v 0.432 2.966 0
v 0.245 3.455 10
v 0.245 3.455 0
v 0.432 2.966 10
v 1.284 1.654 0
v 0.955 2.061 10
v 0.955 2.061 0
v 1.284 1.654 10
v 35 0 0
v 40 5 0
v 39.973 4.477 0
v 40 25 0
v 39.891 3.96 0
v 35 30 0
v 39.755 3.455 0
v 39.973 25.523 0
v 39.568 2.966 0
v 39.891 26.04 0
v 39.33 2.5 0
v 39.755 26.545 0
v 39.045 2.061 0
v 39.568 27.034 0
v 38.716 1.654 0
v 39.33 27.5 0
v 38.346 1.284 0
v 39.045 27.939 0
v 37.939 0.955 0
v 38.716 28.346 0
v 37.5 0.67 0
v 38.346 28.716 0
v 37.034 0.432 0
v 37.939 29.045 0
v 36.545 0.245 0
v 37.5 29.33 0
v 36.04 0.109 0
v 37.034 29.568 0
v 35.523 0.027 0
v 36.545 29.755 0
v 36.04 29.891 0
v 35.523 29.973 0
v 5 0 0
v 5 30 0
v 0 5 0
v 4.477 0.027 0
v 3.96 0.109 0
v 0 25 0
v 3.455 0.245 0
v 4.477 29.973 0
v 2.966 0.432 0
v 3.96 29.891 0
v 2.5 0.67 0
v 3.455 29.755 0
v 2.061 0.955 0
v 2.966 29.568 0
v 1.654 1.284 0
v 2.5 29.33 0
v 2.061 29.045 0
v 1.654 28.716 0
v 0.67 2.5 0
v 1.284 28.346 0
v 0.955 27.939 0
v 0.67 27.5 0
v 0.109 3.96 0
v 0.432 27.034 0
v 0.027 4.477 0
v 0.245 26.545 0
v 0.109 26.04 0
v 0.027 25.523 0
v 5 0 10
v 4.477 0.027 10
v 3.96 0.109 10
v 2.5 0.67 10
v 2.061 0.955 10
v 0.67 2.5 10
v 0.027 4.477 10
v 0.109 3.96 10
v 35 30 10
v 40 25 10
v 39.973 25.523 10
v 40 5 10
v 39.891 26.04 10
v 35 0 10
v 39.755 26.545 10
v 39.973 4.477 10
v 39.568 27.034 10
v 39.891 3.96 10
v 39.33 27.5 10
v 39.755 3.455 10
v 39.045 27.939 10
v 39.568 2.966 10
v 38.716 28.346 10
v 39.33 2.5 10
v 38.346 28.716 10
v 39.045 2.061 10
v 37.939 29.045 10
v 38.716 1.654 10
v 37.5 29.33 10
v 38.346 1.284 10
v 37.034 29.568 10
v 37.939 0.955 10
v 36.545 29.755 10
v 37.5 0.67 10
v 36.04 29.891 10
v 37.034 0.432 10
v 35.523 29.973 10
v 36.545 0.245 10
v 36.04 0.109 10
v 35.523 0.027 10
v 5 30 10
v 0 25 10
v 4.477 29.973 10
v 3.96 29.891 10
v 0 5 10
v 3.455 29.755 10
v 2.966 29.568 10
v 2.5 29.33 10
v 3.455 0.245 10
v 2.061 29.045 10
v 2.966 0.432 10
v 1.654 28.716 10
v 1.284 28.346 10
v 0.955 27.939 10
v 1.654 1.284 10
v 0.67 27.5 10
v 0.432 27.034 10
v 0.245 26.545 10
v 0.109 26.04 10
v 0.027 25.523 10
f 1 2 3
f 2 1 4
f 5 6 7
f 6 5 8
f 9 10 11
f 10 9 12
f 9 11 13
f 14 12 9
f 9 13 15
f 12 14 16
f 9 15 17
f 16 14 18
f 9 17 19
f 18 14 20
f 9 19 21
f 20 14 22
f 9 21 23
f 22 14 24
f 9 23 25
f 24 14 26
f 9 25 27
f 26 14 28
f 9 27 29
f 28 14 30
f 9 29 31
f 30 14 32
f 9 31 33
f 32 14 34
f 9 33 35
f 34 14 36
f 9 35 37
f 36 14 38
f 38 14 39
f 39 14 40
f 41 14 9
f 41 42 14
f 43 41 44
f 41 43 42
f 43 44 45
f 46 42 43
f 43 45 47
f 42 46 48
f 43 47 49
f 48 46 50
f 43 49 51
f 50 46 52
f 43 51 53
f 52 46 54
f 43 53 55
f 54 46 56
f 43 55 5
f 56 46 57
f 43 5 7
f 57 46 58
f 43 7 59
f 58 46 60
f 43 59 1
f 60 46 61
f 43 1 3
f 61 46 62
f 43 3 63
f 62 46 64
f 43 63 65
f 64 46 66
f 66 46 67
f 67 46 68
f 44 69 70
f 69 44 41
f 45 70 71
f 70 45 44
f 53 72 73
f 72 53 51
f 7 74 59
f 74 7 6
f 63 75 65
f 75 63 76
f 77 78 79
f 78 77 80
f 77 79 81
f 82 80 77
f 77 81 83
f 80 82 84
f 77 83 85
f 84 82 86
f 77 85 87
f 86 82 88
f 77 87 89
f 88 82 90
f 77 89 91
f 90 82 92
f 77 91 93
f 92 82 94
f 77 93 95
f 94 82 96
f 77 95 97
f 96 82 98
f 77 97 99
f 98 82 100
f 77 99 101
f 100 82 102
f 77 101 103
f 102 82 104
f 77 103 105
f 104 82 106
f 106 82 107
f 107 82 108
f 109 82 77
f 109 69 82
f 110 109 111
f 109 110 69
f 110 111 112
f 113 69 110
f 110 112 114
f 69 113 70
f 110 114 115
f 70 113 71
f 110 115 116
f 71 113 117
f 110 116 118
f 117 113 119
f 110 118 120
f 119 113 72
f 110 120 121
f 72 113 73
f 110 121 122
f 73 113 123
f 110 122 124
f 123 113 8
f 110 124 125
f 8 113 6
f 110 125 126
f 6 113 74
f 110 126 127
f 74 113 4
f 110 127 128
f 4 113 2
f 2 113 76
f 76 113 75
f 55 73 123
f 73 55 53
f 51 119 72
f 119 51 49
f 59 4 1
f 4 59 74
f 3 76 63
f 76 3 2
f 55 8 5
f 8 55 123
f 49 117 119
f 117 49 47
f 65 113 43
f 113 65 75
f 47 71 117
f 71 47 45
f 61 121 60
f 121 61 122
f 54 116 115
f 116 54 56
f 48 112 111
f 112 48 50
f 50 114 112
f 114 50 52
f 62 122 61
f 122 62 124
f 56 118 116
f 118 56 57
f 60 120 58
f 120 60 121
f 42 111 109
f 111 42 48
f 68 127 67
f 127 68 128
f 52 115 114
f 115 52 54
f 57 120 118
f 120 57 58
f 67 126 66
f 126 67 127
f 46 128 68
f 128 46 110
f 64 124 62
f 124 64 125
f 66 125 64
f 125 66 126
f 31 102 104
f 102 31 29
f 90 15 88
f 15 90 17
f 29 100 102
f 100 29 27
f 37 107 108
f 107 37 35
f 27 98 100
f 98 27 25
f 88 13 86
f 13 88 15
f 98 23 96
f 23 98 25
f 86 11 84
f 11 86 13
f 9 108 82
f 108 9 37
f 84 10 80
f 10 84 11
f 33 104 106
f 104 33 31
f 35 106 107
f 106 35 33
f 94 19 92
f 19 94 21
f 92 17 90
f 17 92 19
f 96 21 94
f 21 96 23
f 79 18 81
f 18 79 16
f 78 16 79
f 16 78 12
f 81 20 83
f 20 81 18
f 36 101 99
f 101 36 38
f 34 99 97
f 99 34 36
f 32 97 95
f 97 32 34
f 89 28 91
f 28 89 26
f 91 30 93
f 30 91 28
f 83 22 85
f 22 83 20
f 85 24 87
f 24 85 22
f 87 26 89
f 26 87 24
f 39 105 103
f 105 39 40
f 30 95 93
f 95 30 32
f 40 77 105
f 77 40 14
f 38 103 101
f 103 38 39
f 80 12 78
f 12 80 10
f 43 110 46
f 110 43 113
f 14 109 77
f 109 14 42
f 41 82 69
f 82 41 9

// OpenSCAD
module roundedCube(size = [1,1,1],cornerRadius = 3){
    width = size[0];
    depth = size[1];
    height = size[2];

 translate([0,cornerRadius,0])cube([width,depth - (cornerRadius * 2),height]);
    translate([cornerRadius,0,0])cube([width - (cornerRadius * 2),depth,height]);
    x = width - (cornerRadius * 2);
     y = depth - (cornerRadius * 2);
    
    for (i = [0:1]){
    for (l = [0:1]){
    translate([x * i + cornerRadius,y * l + cornerRadius,0])cylinder(h = height,r = cornerRadius,$fn = 60);
        }
        }
    

}
roundedCube([40,30,10],5);
